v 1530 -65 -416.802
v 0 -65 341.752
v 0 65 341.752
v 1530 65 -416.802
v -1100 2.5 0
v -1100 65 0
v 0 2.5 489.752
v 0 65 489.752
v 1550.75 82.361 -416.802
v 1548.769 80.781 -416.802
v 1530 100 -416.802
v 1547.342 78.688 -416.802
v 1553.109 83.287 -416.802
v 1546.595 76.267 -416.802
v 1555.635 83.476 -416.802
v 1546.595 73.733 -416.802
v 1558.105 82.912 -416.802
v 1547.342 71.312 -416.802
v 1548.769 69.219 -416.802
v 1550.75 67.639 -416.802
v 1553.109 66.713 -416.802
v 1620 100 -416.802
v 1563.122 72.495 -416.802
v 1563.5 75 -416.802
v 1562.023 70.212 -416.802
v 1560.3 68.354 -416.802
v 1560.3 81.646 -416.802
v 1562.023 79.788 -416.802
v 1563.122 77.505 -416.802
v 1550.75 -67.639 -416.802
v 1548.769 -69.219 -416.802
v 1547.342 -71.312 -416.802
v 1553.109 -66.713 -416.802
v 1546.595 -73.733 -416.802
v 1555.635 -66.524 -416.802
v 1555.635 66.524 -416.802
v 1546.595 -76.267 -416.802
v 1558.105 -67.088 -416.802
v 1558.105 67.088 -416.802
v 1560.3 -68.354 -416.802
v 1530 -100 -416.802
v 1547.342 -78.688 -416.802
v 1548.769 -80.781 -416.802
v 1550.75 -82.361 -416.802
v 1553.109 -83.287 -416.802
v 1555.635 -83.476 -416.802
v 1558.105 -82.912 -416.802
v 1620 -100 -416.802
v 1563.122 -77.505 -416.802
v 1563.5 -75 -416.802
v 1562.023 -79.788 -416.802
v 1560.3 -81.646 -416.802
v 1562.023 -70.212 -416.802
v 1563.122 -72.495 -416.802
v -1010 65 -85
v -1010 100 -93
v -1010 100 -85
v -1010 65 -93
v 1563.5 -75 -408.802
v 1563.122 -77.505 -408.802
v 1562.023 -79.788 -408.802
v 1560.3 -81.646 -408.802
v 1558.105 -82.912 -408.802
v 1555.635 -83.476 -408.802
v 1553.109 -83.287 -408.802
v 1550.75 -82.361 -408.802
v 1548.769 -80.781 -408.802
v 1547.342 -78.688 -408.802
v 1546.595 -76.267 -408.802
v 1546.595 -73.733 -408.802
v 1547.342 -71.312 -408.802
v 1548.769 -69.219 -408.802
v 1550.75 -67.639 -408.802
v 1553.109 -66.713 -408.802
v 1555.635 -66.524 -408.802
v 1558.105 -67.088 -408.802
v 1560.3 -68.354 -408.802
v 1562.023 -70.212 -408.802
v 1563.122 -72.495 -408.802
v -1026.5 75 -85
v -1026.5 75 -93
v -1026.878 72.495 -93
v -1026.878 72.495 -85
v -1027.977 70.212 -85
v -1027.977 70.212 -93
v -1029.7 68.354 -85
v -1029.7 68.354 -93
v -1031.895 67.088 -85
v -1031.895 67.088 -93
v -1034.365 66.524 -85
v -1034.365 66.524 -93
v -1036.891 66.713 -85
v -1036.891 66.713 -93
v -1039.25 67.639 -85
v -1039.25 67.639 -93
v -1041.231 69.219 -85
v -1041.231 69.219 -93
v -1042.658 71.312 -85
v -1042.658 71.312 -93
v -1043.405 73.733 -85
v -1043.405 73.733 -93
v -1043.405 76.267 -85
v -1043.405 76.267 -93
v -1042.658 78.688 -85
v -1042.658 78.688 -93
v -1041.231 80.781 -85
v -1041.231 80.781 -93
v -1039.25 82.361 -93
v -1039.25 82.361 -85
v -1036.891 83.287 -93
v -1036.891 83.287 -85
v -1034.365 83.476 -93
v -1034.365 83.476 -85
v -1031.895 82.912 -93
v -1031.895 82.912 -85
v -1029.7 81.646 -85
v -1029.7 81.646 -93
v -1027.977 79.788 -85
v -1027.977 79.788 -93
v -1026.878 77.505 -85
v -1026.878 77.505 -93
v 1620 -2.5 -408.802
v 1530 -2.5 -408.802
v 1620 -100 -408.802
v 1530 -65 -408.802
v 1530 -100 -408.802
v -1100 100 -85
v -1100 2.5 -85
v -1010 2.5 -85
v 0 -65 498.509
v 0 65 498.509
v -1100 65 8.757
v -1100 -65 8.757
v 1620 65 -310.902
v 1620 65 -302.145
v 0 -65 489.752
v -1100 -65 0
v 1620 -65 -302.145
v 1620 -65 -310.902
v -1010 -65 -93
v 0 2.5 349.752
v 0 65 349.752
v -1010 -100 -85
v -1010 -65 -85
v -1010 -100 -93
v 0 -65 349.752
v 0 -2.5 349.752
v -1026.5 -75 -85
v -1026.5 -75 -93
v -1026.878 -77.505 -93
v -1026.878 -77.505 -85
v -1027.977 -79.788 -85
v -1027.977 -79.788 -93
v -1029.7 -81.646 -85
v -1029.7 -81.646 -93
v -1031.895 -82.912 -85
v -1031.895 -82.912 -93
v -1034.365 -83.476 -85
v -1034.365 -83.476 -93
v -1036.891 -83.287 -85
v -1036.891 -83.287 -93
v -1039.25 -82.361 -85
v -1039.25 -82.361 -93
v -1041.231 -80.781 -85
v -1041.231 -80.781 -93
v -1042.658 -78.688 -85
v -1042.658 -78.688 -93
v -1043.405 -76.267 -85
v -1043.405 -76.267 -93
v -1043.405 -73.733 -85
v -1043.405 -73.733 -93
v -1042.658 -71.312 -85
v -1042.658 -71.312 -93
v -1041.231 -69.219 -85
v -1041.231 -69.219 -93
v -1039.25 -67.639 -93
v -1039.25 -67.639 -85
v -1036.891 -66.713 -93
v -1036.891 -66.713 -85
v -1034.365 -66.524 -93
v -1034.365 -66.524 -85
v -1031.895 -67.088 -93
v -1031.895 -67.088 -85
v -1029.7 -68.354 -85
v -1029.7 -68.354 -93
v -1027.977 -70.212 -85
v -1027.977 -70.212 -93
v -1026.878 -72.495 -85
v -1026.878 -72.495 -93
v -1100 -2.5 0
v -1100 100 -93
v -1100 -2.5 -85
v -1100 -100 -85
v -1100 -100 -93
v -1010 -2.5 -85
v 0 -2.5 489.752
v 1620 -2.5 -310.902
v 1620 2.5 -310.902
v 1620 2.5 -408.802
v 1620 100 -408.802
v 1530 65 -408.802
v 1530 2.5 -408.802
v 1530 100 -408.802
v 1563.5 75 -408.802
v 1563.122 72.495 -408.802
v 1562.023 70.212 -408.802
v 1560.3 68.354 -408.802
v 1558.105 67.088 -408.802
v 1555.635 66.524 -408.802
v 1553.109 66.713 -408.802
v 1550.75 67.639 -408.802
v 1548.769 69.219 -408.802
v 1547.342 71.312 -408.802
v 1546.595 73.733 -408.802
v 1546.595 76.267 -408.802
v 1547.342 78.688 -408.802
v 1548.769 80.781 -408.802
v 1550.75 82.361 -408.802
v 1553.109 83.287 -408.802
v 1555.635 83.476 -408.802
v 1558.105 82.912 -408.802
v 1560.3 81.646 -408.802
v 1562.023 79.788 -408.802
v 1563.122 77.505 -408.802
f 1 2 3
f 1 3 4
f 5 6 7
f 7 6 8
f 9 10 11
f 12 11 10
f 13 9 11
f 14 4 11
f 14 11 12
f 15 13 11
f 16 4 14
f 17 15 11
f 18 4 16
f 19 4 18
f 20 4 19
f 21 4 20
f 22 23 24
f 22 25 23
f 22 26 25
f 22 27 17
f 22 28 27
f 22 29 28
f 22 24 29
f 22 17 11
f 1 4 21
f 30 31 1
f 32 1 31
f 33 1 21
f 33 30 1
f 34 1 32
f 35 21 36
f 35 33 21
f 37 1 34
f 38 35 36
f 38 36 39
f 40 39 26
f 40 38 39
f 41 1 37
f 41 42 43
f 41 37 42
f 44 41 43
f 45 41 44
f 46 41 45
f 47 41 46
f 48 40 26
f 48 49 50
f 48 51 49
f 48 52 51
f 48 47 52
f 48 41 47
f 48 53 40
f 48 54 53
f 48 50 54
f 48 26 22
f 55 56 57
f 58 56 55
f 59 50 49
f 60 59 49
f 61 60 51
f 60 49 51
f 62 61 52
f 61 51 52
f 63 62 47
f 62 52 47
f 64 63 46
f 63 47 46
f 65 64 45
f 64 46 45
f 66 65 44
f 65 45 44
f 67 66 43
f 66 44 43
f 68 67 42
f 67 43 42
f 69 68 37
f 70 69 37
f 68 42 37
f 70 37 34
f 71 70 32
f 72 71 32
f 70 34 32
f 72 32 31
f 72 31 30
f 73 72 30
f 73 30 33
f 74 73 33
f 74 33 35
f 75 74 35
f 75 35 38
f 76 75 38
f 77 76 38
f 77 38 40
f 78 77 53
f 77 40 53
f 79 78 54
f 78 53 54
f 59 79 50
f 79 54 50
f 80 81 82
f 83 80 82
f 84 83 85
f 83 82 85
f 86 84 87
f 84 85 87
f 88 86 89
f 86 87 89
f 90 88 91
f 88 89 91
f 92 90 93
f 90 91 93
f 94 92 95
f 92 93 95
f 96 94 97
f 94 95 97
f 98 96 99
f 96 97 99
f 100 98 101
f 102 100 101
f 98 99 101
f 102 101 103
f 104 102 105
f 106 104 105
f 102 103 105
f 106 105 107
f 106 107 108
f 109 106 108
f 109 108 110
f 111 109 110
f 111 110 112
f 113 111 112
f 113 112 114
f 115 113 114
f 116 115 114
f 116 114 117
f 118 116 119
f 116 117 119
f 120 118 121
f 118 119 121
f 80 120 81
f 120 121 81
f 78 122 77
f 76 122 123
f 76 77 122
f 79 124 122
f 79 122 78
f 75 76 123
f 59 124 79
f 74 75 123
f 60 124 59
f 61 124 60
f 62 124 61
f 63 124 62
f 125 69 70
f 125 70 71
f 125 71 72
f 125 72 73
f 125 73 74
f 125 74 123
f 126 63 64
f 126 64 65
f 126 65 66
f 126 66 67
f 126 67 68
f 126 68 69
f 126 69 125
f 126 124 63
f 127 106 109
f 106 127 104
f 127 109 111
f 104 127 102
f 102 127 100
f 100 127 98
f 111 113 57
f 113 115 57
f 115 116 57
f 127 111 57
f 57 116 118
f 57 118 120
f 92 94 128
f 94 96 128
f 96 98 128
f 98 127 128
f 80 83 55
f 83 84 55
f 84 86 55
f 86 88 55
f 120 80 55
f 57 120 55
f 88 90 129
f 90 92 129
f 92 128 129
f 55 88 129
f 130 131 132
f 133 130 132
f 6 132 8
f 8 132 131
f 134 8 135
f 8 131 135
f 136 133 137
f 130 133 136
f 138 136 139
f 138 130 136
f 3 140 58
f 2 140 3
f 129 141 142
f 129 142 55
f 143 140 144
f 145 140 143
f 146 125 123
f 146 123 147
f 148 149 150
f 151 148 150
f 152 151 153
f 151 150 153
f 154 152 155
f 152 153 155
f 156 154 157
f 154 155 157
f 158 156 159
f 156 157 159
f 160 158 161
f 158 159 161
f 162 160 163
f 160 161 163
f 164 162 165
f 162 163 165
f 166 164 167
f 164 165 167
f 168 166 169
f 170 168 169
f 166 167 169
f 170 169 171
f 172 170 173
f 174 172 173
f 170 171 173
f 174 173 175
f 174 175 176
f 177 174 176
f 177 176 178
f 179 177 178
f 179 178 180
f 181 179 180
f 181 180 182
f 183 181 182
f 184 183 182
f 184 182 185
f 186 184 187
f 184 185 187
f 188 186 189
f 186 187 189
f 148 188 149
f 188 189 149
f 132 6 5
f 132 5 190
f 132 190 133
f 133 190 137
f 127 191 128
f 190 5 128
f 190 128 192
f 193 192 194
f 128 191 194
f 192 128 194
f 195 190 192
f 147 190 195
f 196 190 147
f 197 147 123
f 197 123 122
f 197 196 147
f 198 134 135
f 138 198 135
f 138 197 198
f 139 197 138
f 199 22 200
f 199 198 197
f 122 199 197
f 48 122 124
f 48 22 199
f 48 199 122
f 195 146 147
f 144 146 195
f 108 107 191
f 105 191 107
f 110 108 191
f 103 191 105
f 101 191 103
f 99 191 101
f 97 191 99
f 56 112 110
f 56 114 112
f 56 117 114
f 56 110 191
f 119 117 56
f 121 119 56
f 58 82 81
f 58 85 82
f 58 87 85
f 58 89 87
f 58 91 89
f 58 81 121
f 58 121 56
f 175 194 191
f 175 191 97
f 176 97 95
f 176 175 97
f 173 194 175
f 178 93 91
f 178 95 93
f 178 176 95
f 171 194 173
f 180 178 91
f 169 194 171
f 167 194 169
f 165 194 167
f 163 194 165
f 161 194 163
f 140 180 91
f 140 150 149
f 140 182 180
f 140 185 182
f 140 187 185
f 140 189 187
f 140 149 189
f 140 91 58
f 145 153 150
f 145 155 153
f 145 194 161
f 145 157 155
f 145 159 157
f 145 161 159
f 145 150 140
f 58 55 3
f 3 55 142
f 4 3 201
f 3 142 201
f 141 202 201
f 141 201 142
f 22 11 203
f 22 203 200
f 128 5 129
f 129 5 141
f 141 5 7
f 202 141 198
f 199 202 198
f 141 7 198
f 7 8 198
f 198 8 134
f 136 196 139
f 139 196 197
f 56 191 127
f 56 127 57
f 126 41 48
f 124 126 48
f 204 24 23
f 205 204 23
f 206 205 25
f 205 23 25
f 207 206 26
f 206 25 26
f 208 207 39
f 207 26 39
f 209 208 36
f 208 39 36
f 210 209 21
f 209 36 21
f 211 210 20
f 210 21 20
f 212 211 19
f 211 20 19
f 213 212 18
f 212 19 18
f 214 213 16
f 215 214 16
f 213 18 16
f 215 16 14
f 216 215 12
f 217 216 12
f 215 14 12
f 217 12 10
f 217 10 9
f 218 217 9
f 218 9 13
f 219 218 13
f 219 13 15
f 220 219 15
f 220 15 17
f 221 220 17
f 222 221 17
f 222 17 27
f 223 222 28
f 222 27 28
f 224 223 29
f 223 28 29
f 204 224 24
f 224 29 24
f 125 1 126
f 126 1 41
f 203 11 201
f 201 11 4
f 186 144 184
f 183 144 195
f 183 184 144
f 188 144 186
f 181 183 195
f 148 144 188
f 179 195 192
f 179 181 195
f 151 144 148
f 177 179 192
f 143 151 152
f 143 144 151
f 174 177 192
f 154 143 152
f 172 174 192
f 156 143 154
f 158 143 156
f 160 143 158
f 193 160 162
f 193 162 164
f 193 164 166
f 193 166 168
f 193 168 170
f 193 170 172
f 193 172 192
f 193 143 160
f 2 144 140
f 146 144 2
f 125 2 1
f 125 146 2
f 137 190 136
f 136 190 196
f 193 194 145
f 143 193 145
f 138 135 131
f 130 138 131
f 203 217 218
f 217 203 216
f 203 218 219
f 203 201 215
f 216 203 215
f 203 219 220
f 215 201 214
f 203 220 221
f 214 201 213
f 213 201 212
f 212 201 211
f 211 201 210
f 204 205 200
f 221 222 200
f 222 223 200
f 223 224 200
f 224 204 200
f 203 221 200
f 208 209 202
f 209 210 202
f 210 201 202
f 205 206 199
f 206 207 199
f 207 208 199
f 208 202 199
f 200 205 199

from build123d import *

# Parameters (mm, degrees)
F1_DEPTH = 2.5
F3_DEPTH = 65
F4_W     = 90
F4_H     = 200
F4_R     = 8.5
F5_DEPTH = 8
F6_W     = 90
F6_H     = 200
F6_R     = 8.5
F7_DEPTH = 8


with BuildPart() as f1:
    # F0 (on Front) → F1 (new body, symmetric)
    with BuildSketch(Plane.XZ):
        Polygon((1620, -310.9023153198), (0, 489.7515538394), (-1100, 0), (-1100, -85), (-1010, -85), (0, 349.7515538394), (1530, -408.8023153198), (1620, -408.8023153198), align=None)
    extrude(amount=F1_DEPTH, both=True)

    # F2 (on Front) → F3 (join, symmetric)
    with BuildSketch(Plane.XZ):
        Polygon((-1100, 8.757090228), (-1100, 0), (0, 489.7515538394), (1620, -310.9023153198), (1620, -302.1452250917), (0, 498.5086440674), align=None)
        Polygon((1530, -408.8023153198), (0, 349.7515538394), (-1010, -85), (-1100, -85), (-1100, -93), (-1010, -93), (0, 341.7515538394), (1530, -416.8023153198), (1620, -416.8023153198), (1620, -408.8023153198), align=None)
    extrude(amount=F3_DEPTH, both=True)

    # F4 (on face) → F5 (join)
    with BuildSketch(Plane(origin=(0, 0, -93), x_dir=(1, 0, 0), z_dir=(0, 0, -1))):
        with Locations((-1055, 0)):
            Rectangle(F4_W, F4_H)
        with Locations((-1035, -75)):
            Circle(F4_R, mode=Mode.SUBTRACT)
        with Locations((-1035, 75)):
            Circle(F4_R, mode=Mode.SUBTRACT)
    extrude(amount=-F5_DEPTH)

    # F6 (on face) → F7 (join)
    with BuildSketch(Plane(origin=(0, 0, -416.8023153198), x_dir=(1, 0, 0), z_dir=(0, 0, -1))):
        with Locations((1575, 0)):
            Rectangle(F6_W, F6_H)
        with Locations((1555, -75)):
            Circle(F6_R, mode=Mode.SUBTRACT)
        with Locations((1555, 75)):
            Circle(F6_R, mode=Mode.SUBTRACT)
    extrude(amount=-F7_DEPTH)


solid = f1.part
